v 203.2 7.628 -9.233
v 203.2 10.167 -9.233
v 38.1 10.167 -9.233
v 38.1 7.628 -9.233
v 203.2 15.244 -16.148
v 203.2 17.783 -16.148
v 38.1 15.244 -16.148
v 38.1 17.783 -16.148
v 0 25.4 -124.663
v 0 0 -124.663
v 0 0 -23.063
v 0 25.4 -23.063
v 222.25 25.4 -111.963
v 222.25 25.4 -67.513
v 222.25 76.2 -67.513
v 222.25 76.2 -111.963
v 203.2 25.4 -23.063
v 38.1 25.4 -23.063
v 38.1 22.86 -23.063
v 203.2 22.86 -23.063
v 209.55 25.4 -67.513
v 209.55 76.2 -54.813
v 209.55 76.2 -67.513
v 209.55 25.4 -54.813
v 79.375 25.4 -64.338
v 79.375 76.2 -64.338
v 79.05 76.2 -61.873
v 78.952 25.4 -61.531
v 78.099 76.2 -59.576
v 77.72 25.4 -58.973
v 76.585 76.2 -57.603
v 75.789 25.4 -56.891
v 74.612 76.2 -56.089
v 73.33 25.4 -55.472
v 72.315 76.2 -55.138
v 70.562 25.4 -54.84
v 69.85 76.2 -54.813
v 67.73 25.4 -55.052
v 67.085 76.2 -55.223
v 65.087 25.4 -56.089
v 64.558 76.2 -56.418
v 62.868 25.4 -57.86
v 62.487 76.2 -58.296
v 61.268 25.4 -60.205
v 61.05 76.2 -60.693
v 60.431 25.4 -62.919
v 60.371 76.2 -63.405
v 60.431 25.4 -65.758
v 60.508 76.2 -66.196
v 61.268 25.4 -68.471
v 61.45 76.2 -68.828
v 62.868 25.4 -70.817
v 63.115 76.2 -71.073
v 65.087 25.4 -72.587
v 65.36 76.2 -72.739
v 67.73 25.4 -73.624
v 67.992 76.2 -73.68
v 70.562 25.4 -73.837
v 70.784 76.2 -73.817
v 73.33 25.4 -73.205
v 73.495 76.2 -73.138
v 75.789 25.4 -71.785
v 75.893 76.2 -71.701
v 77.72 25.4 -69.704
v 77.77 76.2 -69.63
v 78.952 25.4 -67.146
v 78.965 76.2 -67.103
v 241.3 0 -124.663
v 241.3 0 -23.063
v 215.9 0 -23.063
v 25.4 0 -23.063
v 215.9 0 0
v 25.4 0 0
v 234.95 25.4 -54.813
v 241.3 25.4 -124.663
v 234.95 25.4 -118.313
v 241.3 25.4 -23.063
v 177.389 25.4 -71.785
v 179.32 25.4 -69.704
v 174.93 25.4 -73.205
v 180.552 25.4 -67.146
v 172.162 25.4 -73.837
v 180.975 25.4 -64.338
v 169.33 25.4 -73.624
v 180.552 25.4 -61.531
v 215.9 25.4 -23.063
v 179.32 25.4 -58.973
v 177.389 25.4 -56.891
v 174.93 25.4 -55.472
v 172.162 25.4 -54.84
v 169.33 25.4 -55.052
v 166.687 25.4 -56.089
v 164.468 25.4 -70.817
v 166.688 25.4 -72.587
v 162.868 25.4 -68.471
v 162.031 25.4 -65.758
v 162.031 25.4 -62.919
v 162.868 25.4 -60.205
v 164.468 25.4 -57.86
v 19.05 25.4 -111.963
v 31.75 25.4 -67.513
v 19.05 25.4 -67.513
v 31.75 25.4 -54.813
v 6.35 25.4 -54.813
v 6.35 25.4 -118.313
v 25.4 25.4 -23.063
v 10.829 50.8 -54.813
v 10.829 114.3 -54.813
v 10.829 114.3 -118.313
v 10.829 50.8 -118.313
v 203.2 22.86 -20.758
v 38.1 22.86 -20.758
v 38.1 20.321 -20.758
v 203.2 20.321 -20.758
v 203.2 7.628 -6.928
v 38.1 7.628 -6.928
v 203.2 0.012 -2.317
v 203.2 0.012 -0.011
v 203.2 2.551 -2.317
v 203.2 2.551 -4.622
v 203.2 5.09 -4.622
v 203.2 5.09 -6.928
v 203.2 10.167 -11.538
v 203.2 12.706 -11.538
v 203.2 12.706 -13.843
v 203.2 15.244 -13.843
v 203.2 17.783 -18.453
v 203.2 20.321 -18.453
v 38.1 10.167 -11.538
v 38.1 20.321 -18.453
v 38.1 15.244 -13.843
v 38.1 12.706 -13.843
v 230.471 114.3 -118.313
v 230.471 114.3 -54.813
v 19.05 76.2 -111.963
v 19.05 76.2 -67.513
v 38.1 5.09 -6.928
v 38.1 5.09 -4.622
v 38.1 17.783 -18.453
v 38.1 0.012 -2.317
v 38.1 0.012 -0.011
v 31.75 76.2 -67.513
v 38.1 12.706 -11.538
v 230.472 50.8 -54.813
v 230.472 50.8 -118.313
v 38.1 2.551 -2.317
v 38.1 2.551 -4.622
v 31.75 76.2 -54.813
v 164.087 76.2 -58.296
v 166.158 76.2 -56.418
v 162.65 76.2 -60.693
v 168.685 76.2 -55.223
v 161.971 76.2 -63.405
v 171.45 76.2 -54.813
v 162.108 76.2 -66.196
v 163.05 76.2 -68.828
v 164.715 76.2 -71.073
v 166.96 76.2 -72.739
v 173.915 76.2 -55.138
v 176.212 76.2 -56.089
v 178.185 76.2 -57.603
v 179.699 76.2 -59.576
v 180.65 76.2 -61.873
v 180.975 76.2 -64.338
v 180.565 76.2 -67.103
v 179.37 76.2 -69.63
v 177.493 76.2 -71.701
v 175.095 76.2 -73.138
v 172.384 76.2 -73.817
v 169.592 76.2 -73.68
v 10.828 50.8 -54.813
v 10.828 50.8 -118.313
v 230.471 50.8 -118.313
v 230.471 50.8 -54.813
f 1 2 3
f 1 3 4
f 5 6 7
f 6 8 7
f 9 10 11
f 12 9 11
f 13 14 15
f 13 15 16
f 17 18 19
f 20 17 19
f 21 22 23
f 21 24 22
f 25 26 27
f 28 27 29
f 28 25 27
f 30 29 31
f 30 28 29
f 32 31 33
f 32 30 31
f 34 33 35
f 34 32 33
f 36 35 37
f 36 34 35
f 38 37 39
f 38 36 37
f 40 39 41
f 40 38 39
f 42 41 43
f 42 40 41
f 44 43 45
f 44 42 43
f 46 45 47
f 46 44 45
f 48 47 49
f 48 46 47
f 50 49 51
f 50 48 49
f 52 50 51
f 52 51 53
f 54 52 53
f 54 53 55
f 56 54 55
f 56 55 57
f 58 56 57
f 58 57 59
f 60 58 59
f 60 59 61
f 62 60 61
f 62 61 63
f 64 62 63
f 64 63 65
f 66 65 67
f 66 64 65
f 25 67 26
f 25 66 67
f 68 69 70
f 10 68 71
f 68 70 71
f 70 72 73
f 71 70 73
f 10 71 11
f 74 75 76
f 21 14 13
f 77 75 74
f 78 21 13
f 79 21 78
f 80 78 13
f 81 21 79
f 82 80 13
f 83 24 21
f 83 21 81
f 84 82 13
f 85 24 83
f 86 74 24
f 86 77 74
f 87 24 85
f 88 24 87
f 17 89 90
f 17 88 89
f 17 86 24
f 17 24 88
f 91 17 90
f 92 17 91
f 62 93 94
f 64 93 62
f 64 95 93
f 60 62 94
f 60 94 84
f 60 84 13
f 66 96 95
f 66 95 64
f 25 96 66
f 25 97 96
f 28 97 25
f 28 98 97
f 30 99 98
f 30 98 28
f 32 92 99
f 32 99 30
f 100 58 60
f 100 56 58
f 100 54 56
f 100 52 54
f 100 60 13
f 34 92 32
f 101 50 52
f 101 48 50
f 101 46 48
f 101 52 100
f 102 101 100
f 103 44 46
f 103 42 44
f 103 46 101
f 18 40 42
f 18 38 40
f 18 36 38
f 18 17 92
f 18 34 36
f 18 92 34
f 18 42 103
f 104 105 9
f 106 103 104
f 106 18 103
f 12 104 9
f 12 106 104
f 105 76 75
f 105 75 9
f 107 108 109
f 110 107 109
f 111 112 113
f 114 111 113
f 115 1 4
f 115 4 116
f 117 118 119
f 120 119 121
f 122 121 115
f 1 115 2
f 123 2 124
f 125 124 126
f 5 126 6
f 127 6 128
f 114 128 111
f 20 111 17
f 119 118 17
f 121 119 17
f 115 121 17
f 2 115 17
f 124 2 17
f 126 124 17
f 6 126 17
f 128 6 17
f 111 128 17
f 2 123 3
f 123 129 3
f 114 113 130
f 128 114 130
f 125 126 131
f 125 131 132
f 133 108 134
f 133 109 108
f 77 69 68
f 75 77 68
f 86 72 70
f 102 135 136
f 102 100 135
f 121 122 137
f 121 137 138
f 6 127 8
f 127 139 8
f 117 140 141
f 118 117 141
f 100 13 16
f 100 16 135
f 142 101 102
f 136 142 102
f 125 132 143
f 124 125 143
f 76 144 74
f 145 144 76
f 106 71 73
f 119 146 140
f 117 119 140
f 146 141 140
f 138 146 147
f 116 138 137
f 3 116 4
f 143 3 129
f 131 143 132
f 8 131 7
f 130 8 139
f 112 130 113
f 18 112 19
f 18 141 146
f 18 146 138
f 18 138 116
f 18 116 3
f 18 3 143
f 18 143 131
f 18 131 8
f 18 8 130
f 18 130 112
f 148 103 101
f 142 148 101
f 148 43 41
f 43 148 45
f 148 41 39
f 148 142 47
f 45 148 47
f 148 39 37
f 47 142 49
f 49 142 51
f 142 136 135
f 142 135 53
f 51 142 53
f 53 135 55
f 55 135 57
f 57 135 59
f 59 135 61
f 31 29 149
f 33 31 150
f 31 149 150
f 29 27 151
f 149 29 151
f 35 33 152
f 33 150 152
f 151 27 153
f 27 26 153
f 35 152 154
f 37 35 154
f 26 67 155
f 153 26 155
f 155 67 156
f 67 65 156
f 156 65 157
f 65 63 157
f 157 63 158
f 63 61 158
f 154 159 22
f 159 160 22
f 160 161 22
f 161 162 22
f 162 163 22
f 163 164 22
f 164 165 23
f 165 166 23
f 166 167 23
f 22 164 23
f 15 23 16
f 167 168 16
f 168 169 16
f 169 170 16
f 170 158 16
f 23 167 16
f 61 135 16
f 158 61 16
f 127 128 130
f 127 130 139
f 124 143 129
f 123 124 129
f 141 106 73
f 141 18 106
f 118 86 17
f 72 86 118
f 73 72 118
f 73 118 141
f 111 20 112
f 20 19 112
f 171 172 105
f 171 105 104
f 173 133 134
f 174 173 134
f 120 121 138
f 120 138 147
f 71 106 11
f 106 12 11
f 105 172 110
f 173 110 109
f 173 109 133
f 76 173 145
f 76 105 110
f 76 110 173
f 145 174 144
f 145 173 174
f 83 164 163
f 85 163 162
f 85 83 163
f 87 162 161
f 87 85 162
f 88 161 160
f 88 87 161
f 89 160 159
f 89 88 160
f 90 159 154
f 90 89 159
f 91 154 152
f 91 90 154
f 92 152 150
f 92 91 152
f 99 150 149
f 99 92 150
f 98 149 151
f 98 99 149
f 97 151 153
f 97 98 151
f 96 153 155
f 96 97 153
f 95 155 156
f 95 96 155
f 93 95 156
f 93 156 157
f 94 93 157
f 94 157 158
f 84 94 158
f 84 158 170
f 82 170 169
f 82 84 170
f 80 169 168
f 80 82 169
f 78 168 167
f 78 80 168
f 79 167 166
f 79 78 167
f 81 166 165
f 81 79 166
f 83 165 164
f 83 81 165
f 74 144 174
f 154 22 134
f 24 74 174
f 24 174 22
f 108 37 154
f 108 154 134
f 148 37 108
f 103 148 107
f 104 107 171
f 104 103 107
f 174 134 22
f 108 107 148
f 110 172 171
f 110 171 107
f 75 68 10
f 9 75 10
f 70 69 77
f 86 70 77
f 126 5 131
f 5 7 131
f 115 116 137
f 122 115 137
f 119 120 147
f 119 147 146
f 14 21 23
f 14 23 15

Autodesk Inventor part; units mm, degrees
ref_plane "YZ Plane" through (0, 0, 0) normal (1, 0, 0) x (0, 1, 0)
ref_plane "XZ Plane" through (0, 0, 0) normal (0, 1, 0) x (-1, 0, 0)
sketch "Sketch1" plane through (0, 0, 0) normal (0, 1, 0) x (-1, 0, 0)
  line L0 (0, 0) -> (-241.3, 0)
  line L1 (-241.3, 0) -> (-241.3, -124.6632)
  line L2 (-241.3, -124.6632) -> (0, -124.6632)
  line L3 (0, -124.6632) -> (0, 0)
  dimension "d0" = 124.6632
  dimension "d1" = 241.3
extrude "Extrusion1" add sketch "Sketch1" along normal blind 25.4
sketch "Sketch2" plane through (241.3, 0, 0) normal (1, 0, 0) x (0, 0, -1)
  line L0 (124.6632, 0) -> (226.2632, 0) construction
  line L1 (23.0632, 25.4) -> (0, 0)
  line L2 (0, 0) -> (0, 25.4)
  line L3 (0, 0) -> (0, 25.4) projected
  line L4 (0, 25.4) -> (23.0632, 25.4)
  line L5 (0, 0) -> (23.0632, 0)
  line L6 (0, 0) -> (124.6632, 0) projected
  line L7 (23.0632, 0) -> (23.0632, 25.4)
extrude "Extrusion2" cut sketch "Sketch2" against normal blind 25.4
ref_plane "Work Plane1" through (120.65, 0, -124.6632) normal (1, 0, 0) x (0, 0, -1)
mirror "Mirror1" about plane through (120.65, 0, -124.6632) normal (1, 0, 0) of "Extrusion2"
extrude "Extrusion3" cut sketch "Sketch2" against normal blind 228.6 contours L1 L2 L4
sketch "Sketch3" plane through (120.65, 0, -124.6632) normal (1, 0, 0) x (0, 0, -1)
  line L0 (-101.6, 25.4) -> (-101.6, 22.86)
  line L1 (-101.6, 0) -> (-101.6, 25.4) projected
  line L2 (-101.6, 22.86) -> (-104.14, 22.86)
  line L3 (-104.14, 22.86) -> (-104.14, 30.1007)
  line L4 (-104.14, 30.1007) -> (-101.6, 30.1564)
  line L5 (-101.6, 30.1564) -> (-101.6, 25.4)
  point P0 (-124.6632, 0)
  dimension "d10" = 2.54
  dimension "d11" = 2.54
extrude "Extrusion4" cut sketch "Sketch3" along normal mid plane 165.1
pattern_linear "Rectangular Pattern1" count 10 spacing 3.429 along (0, -0.7403, 0.6722) of "Extrusion4"
sketch "Sketch4" plane through (0, 25.4, 0) normal (0, 1, 0) x (1, 0, 0)
  line L0 (6.35, 118.3132) -> (234.95, 118.3132)
  line L1 (234.95, 118.3132) -> (234.95, 54.8132)
  line L2 (6.35, 54.8132) -> (6.35, 118.3132)
  line L3 (241.3, 23.0632) -> (241.3, 124.6632) projected
  line L4 (0, 124.6632) -> (0, 23.0632) projected
  line L5 (241.3, 124.6632) -> (0, 124.6632) projected
  line L6 (222.25, 67.5132) -> (222.25, 111.9632)
  line L7 (222.25, 111.9632) -> (19.05, 111.9632)
  line L8 (19.05, 111.9632) -> (19.05, 67.5132)
  line L9 (234.95, 54.8132) -> (222.25, 54.8132)
  line L10 (19.05, 54.8132) -> (6.35, 54.8132)
  circle A0 centre (69.85, 64.3382) radius 9.525
  circle A1 centre (171.45, 64.3382) radius 9.525
  line L11 (19.05, 54.8132) -> (31.75, 54.8132)
  line L12 (31.75, 54.8132) -> (31.75, 67.5132)
  line L13 (31.75, 67.5132) -> (19.05, 67.5132)
  line L14 (222.25, 54.8132) -> (209.55, 54.8132)
  line L15 (209.55, 54.8132) -> (209.55, 67.5132)
  line L16 (209.55, 67.5132) -> (222.25, 67.5132)
  point P0 (0, 0)
  dimension "d17" = 6.35
  dimension "d18" = 6.35
  dimension "d19" = 6.35
  dimension "d23" = 12.7
  dimension "d24" = 12.7
  dimension "d25" = 6.35
  dimension "d26" = 19.05
  dimension "d27" = 19.05
  dimension "d28" = 9.525
  dimension "d29" = 50.8
  dimension "d39" = 12.7
  dimension "d40" = 12.7
  dimension "d41" = 12.7
  dimension "d42" = 12.7
extrude "Extrusion6" add sketch "Sketch4" along normal blind 25.4
chamfer "Chamfer1" distance 25.4 angle 10 1 edges at (234.95, 50.8, -86.5632) measured on face at (234.95, 33.8667, -97.1465)
chamfer "Chamfer2" distance 25.4 angle 10 1 edges at (6.35, 50.8, -86.5632) measured on face at (6.35, 33.8667, -75.9799)
sketch "Sketch5" plane through (0, 50.8, 0) normal (0, 1, 0) x (1, 0, 0)
  line L0 (10.8287, 54.8132) -> (10.8287, 118.3132) projected
  line L1 (10.8287, 54.8132) -> (31.75, 54.8132) projected
  line L2 (19.05, 67.5132) -> (19.05, 111.9632) projected
  line L3 (19.05, 111.9632) -> (222.25, 111.9632) projected
  line L4 (222.25, 111.9632) -> (222.25, 67.5132) projected
  line L5 (209.55, 54.8132) -> (230.4713, 54.8132) projected
  line L6 (230.4713, 118.3132) -> (230.4713, 54.8132) projected
  line L7 (230.4713, 118.3132) -> (10.8287, 118.3132) projected
  circle A0 centre (69.85, 64.3382) radius 9.525 projected
  circle A1 centre (171.45, 64.3382) radius 9.525 projected
  line L8 (31.75, 54.8132) -> (31.75, 67.5132) projected
  line L9 (31.75, 67.5132) -> (19.05, 67.5132) projected
  line L10 (222.25, 67.5132) -> (209.55, 67.5132) projected
  line L11 (209.55, 67.5132) -> (209.55, 54.8132) projected
  point P0 (0, 0)
extrude "Extrusion7" add sketch "Sketch5" along normal blind 25.4
sketch "Sketch6" plane through (0, 76.2, 0) normal (0, 1, 0) x (1, 0, 0)
  line L0 (10.8287, 118.3132) -> (230.4713, 118.3132)
  line L1 (230.4713, 118.3132) -> (230.4713, 54.8132)
  line L2 (230.4713, 54.8132) -> (10.8287, 54.8132)
  line L3 (10.8287, 54.8132) -> (10.8287, 118.3132)
  point P0 (0, 0)
extrude "Extrusion8" add sketch "Sketch6" along normal blind 38.1
properties part number "Stand"
